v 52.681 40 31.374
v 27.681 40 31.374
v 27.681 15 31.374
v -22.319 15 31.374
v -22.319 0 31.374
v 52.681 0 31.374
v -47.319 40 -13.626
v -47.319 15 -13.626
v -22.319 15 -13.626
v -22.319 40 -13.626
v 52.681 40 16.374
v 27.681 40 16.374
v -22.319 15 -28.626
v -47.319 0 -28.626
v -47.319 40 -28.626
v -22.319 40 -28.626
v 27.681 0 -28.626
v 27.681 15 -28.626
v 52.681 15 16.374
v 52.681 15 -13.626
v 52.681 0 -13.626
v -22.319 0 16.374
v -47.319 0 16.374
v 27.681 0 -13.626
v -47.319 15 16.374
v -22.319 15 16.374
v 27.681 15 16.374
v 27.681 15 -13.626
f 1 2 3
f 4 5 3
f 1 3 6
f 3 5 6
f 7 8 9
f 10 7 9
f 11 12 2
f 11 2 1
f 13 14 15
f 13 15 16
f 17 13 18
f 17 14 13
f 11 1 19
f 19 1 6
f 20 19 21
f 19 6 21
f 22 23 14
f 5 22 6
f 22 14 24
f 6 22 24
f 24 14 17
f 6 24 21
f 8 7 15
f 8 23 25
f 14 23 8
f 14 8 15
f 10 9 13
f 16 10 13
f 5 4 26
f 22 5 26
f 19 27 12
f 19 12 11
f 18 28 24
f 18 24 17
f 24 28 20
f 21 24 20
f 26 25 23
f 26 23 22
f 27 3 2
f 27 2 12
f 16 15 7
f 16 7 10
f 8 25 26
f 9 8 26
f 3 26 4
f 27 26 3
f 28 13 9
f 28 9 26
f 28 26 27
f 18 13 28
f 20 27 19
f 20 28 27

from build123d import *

# Parameters (mm, degrees)
SKETCH2_W           = 100
SKETCH2_H           = 60
BOSS_EXTRUDE1_DEPTH = 15
SKETCH3_W           = 25
SKETCH3_H           = 15
BOSS_EXTRUDE2_DEPTH = 25
SKETCH4_W           = 25
SKETCH4_H           = 15
BOSS_EXTRUDE3_DEPTH = 25
SKETCH5_W           = 25
SKETCH5_H           = 15
CUT_EXTRUDE1_DEPTH  = 15
SKETCH6_W           = 25
SKETCH6_H           = 15
CUT_EXTRUDE2_DEPTH  = 15


with BuildPart() as part:
    # Sketch2 → Boss-Extrude1 (new body)
    with BuildSketch(Plane(origin=(0, 0, 0), x_dir=(1, 0, 0), z_dir=(0, 1, 0))):
        with Locations((2.681325602, -1.373990244)):
            Rectangle(SKETCH2_W, SKETCH2_H)
    extrude(amount=BOSS_EXTRUDE1_DEPTH)

    # Sketch3 → Boss-Extrude2 (add)
    with BuildSketch(Plane(origin=(0, 15, 0), x_dir=(1, 0, 0), z_dir=(0, 1, 0))):
        with Locations((-34.818674398, 21.126009756)):
            Rectangle(SKETCH3_W, SKETCH3_H)
    extrude(amount=BOSS_EXTRUDE2_DEPTH)

    # Sketch4 → Boss-Extrude3 (add)
    with BuildSketch(Plane(origin=(0, 15, 0), x_dir=(1, 0, 0), z_dir=(0, 1, 0))):
        with Locations((40.181325602, -23.873990244)):
            Rectangle(SKETCH4_W, SKETCH4_H)
    extrude(amount=BOSS_EXTRUDE3_DEPTH)

    # Sketch5 → Cut-Extrude1 (cut)
    with BuildSketch(Plane(origin=(0, 15, 0), x_dir=(1, 0, 0), z_dir=(0, 1, 0))):
        with Locations((-34.818674398, -23.873990244)):
            Rectangle(SKETCH5_W, SKETCH5_H)
    extrude(amount=-CUT_EXTRUDE1_DEPTH, mode=Mode.SUBTRACT)

    # Sketch6 → Cut-Extrude2 (cut)
    with BuildSketch(Plane(origin=(0, 15, 0), x_dir=(1, 0, 0), z_dir=(0, 1, 0))):
        with Locations((40.181325602, 21.126009756)):
            Rectangle(SKETCH6_W, SKETCH6_H)
    extrude(amount=-CUT_EXTRUDE2_DEPTH, mode=Mode.SUBTRACT)


solid = part.part
